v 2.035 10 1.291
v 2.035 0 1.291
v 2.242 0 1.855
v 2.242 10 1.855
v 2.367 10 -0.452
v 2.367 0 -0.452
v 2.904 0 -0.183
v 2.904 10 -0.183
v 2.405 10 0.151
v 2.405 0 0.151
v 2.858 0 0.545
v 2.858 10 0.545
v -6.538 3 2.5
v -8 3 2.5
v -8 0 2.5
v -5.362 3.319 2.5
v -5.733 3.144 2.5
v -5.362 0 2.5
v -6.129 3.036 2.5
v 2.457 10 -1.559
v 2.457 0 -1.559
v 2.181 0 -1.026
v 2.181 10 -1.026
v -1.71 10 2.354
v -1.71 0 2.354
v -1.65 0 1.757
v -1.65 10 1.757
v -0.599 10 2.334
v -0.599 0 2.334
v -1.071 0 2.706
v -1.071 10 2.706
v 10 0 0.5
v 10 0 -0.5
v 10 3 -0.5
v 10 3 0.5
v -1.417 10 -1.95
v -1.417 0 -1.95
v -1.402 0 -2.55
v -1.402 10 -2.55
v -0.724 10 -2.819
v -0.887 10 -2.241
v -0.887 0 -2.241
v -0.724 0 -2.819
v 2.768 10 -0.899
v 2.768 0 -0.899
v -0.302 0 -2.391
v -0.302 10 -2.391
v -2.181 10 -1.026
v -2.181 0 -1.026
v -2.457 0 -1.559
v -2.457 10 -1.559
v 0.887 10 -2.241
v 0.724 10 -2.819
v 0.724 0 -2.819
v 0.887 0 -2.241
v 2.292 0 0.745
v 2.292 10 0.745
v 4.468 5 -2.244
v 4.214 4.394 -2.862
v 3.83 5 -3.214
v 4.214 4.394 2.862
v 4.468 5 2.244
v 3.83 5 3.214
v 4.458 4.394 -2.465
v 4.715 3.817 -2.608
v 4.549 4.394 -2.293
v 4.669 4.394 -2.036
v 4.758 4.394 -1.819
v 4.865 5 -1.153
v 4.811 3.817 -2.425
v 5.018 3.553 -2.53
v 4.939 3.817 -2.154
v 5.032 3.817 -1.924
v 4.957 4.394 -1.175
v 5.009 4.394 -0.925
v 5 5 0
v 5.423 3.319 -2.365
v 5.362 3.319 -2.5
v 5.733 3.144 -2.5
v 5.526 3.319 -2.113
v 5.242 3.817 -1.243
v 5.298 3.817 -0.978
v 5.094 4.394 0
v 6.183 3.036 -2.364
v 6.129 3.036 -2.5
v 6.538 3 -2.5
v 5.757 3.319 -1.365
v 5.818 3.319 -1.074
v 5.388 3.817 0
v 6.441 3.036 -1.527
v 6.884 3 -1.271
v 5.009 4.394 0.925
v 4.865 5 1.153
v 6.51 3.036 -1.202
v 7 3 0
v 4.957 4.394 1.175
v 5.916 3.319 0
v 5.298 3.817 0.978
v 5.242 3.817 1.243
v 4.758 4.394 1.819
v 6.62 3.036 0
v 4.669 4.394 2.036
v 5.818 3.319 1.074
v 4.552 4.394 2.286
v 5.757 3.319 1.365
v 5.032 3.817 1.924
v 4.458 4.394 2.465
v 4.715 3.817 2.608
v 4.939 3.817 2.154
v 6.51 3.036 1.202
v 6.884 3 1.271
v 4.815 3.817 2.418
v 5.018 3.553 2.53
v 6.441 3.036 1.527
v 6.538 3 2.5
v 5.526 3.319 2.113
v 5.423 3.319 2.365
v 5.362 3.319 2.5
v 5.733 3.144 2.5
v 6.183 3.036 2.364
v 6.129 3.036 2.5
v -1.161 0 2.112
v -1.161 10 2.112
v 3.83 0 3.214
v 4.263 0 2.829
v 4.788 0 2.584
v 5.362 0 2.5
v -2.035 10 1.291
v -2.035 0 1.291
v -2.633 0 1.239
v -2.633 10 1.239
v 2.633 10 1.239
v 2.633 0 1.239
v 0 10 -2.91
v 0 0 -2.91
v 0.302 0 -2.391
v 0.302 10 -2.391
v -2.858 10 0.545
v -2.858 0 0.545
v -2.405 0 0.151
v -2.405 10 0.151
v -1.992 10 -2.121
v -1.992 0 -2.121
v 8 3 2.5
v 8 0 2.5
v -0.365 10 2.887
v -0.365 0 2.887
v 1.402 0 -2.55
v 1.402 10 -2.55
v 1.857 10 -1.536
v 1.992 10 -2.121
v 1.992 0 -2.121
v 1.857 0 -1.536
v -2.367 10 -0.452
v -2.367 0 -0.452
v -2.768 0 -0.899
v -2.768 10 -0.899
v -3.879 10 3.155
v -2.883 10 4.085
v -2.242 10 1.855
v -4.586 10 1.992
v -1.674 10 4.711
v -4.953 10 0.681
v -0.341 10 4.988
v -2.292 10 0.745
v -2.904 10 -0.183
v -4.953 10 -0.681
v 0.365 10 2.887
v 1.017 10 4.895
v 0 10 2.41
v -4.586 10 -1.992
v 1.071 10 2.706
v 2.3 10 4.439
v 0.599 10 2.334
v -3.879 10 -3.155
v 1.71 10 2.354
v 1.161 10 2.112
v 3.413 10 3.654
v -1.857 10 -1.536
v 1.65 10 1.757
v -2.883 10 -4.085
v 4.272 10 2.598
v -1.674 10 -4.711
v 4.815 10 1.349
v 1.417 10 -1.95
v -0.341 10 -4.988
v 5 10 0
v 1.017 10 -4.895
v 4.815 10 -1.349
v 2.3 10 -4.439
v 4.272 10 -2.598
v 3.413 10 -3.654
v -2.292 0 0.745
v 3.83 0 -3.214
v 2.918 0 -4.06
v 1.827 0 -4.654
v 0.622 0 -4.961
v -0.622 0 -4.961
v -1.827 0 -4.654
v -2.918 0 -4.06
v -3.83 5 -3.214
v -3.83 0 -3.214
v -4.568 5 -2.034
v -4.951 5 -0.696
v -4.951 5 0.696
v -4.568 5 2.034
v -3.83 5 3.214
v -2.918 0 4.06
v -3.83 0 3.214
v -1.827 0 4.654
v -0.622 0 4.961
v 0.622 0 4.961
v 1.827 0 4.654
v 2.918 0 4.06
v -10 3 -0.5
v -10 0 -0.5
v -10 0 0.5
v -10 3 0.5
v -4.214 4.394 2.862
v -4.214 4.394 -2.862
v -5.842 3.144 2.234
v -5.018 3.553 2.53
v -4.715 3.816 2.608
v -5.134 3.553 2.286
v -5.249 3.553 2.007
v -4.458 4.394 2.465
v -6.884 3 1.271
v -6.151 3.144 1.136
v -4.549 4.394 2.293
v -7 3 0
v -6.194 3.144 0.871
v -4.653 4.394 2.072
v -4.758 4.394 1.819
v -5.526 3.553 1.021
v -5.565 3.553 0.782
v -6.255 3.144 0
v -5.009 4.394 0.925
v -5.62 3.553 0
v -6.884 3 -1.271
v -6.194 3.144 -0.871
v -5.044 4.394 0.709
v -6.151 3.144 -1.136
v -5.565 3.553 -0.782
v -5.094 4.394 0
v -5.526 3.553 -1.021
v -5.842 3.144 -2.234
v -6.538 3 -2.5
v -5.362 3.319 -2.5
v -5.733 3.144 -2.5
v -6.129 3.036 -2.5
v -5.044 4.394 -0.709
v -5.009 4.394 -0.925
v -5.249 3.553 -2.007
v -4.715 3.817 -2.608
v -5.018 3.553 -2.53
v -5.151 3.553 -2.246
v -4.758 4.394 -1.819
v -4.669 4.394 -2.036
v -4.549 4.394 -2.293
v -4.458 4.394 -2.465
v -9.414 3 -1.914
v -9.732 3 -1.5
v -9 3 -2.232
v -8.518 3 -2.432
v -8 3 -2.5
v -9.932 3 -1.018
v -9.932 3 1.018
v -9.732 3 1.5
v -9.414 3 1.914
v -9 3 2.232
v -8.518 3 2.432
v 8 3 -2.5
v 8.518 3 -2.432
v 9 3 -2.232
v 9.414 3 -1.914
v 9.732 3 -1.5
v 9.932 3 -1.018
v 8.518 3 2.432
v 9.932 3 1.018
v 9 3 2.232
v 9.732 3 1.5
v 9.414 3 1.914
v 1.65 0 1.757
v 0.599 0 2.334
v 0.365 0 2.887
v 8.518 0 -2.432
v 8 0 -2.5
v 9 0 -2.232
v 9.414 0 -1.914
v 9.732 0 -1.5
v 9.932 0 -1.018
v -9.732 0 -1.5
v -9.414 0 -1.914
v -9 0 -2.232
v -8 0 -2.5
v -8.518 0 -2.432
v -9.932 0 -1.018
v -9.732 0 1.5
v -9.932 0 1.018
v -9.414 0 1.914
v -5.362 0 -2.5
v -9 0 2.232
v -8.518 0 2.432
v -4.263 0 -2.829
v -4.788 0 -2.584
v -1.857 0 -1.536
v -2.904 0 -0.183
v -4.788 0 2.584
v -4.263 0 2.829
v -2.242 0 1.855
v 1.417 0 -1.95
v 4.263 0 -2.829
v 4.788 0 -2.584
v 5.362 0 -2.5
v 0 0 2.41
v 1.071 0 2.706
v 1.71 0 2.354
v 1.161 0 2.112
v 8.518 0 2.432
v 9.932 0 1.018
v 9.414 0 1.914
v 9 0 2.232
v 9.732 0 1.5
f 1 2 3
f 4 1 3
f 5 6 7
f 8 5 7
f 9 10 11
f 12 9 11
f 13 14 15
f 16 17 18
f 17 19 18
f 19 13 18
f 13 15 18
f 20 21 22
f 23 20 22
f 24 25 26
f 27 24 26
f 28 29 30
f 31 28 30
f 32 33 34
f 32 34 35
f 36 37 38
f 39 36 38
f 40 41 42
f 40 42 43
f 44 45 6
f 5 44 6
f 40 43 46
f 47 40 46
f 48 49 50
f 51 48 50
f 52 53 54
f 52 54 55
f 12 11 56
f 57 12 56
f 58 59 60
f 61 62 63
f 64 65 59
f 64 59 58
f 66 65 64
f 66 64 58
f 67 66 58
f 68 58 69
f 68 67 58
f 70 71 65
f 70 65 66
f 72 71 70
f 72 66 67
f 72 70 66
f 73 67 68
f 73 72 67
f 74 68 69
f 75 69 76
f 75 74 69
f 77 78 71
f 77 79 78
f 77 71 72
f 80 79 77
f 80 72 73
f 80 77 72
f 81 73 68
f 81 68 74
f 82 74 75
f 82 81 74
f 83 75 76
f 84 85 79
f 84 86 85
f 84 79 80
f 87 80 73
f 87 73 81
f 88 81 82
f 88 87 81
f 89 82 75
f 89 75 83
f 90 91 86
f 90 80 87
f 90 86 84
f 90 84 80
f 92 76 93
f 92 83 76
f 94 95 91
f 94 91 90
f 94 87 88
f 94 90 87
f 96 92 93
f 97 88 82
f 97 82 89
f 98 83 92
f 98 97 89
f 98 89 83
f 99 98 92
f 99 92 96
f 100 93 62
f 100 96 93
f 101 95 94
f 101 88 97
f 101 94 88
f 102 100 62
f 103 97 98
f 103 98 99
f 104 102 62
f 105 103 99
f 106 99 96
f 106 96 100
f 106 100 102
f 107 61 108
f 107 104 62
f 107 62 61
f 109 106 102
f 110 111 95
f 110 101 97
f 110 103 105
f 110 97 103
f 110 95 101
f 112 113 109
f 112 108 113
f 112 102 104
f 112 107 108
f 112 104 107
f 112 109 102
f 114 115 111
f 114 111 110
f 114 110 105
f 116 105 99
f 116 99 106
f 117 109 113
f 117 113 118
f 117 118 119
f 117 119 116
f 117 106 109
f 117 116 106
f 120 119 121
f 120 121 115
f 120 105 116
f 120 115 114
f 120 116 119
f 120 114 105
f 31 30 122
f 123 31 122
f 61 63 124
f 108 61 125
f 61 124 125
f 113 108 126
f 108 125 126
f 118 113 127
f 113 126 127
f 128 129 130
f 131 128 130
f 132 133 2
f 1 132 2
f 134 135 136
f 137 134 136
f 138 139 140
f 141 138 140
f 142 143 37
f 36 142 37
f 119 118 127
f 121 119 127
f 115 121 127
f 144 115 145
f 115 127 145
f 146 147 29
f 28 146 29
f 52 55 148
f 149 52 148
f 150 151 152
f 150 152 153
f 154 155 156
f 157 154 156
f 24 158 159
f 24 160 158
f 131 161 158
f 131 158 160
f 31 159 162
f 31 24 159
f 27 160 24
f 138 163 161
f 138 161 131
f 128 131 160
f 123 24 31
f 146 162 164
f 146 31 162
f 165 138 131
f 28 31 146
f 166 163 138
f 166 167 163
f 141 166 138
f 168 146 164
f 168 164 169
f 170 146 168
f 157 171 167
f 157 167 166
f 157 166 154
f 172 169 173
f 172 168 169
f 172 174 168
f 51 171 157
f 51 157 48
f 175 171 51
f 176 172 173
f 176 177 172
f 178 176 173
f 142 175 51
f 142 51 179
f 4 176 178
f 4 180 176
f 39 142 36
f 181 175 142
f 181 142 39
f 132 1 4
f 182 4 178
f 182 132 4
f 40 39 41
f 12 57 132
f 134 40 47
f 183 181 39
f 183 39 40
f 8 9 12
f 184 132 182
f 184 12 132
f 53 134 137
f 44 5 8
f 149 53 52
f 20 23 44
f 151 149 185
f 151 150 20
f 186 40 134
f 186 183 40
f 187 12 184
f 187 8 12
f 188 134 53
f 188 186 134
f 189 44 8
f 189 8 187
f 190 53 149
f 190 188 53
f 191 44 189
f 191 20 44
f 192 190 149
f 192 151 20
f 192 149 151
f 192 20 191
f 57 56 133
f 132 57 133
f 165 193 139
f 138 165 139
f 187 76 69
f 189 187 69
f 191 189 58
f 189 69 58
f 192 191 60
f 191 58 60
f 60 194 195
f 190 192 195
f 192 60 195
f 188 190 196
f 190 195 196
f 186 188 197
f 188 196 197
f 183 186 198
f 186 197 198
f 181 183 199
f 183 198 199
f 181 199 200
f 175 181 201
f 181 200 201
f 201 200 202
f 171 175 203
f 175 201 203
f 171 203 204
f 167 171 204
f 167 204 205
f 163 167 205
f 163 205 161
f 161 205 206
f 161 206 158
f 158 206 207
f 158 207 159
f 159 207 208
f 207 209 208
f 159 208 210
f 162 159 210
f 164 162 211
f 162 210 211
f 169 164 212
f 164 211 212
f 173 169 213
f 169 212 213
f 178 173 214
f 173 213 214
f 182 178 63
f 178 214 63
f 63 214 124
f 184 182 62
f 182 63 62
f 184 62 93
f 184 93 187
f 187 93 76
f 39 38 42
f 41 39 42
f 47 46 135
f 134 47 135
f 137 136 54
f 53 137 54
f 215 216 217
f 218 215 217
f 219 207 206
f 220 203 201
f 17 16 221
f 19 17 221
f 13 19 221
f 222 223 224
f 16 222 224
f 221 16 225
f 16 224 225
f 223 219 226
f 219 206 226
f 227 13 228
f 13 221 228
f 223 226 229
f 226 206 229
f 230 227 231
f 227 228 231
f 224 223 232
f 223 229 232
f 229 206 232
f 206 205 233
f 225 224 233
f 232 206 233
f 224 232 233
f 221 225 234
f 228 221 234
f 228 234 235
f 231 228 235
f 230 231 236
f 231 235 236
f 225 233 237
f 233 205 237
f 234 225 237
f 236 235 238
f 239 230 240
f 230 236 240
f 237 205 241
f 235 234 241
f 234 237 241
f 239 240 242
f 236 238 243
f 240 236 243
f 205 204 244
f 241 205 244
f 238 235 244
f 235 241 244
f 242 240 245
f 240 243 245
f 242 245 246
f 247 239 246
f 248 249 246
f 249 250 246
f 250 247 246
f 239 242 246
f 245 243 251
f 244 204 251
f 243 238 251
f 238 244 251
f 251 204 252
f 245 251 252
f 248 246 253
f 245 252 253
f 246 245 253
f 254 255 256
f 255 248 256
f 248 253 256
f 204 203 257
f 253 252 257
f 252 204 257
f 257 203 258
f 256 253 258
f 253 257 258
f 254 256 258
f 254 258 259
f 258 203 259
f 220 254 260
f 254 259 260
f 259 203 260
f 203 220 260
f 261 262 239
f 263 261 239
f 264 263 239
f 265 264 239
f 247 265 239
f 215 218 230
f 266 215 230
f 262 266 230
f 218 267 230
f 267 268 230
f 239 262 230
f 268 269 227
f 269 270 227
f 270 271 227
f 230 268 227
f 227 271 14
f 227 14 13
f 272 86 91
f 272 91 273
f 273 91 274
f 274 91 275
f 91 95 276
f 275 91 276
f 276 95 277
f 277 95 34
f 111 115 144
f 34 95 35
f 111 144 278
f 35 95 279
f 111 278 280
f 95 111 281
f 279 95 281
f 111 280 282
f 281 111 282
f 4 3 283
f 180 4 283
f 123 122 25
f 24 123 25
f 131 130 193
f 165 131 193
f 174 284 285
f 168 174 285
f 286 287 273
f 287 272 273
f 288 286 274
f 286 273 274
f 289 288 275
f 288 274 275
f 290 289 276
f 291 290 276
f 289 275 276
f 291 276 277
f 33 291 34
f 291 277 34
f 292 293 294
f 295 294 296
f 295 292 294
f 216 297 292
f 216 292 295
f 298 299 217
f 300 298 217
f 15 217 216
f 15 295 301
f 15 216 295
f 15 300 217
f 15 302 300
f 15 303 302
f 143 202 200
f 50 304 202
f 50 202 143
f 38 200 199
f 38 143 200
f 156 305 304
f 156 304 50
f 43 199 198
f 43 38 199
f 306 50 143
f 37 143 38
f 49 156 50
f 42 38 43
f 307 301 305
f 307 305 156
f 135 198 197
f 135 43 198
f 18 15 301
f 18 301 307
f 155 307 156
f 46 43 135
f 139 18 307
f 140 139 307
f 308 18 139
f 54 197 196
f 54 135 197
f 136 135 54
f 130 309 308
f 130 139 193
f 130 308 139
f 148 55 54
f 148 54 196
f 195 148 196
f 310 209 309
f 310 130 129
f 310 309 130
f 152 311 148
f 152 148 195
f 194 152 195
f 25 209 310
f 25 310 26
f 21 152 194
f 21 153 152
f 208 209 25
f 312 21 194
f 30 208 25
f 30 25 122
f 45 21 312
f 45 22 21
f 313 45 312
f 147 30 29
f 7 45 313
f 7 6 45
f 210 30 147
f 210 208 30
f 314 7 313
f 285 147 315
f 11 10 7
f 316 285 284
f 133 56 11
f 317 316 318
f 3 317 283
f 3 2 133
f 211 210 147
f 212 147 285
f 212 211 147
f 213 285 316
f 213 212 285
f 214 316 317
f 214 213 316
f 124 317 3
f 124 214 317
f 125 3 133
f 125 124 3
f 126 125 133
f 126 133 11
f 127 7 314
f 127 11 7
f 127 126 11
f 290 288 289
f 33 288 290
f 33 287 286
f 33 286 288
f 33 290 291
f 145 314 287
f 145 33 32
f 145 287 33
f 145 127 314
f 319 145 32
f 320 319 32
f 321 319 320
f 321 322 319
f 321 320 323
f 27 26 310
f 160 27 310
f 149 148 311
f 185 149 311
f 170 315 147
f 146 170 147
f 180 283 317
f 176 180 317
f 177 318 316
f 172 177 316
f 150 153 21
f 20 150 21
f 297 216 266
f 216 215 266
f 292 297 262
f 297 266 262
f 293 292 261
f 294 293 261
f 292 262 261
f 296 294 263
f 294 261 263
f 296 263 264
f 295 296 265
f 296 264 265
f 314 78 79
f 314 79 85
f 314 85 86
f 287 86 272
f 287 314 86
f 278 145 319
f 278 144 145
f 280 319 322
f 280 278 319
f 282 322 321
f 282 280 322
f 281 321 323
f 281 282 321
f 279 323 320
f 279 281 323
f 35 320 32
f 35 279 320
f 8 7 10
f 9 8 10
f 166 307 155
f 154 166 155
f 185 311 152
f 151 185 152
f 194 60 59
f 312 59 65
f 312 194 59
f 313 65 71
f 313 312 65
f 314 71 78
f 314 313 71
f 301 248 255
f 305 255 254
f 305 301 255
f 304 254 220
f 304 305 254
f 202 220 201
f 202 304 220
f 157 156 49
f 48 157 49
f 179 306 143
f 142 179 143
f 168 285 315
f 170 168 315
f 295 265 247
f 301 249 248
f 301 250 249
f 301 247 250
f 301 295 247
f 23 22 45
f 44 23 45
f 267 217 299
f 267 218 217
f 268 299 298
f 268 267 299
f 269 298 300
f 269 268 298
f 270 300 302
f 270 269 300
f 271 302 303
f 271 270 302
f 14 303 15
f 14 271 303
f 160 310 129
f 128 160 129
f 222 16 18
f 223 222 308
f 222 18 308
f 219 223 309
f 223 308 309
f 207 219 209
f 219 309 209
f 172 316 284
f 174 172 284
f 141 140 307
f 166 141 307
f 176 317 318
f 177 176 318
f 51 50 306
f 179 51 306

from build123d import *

# Parameters (mm, degrees)
SKETCH3_R           = 5
BOSS_EXTRUDE1_DEPTH = 10
SKETCH4_W           = 20
SKETCH4_H           = 5
BOSS_EXTRUDE2_DEPTH = 3
CUT_EXTRUDE1_DEPTH  = 11
FILLET2_R           = 2


with BuildPart() as part:
    # Sketch3 → Boss-Extrude1 (new body)
    with BuildSketch(Plane(origin=(0, 0, 0), x_dir=(1, 0, 0), z_dir=(0, 1, 0))):
        Circle(SKETCH3_R)
    extrude(amount=BOSS_EXTRUDE1_DEPTH)

    # Sketch4 → Boss-Extrude2 (add)
    with BuildSketch(Plane.XZ):
        Rectangle(SKETCH4_W, SKETCH4_H)
    extrude(amount=-BOSS_EXTRUDE2_DEPTH)

    # Sketch2 → Cut-Extrude1 (cut, through all)
    with BuildSketch(Plane(origin=(0, 0, 0), x_dir=(1, 0, 0), z_dir=(0, 1, 0))):
        Polygon((-0.302053093, 2.39099643), (0, 2.91), (0.302053093, 2.39099643), (0.723687572, 2.818576999), (0.887180172, 2.240761331), (1.401903192, 2.550052439), (1.416562458, 1.949730956), (1.992032078, 2.121298706), (1.856936915, 1.536191815), (2.456994263, 1.559255973), (2.180633196, 1.026128093), (2.767574462, 0.899239454), (2.367312274, 0.451588968), (2.90425778, 0.182720412), (2.405244416, -0.151325152), (2.8584559, -0.545279625), (2.292046204, -0.744730956), (2.633046723, -1.239017738), (2.0348303, -1.291342576), (2.242193536, -1.85490381), (1.649758525, -1.756814392), (1.710455084, -2.354239454), (1.161026355, -2.111899099), (1.071242448, -2.705649574), (0.599342628, -2.334285418), (0.36471971, -2.887053781), (0, -2.41), (-0.36471971, -2.887053781), (-0.599342628, -2.334285418), (-1.071242448, -2.705649574), (-1.161026355, -2.111899099), (-1.710455084, -2.354239454), (-1.649758525, -1.756814392), (-2.242193536, -1.85490381), (-2.0348303, -1.291342576), (-2.633046723, -1.239017738), (-2.292046204, -0.744730956), (-2.8584559, -0.545279625), (-2.405244416, -0.151325152), (-2.90425778, 0.182720412), (-2.367312274, 0.451588968), (-2.767574462, 0.899239454), (-2.180633196, 1.026128093), (-2.456994263, 1.559255973), (-1.856936915, 1.536191815), (-1.992032078, 2.121298706), (-1.416562458, 1.949730956), (-1.401903192, 2.550052439), (-0.887180172, 2.240761331), (-0.723687572, 2.818576999), align=None)
    extrude(amount=CUT_EXTRUDE1_DEPTH, mode=Mode.SUBTRACT)

    # Fillet2
    fillet2_edges = [part.edges().sort_by_distance(p)[0] for p in [
        (10, 1.5, -2.5),
        (-10, 1.5, 2.5),
        (10, 1.5, 2.5),
        (4.330127019, 1.5, -2.5),
        (-4.330127019, 1.5, -2.5),
        (-10, 1.5, -2.5),
        (-4.330127019, 1.5, 2.5),
        (4.330127019, 1.5, 2.5),
        (-5, 3, 0),
        (4.829629131, 3, -1.294095226),
    ]]
    fillet(fillet2_edges, radius=FILLET2_R)


solid = part.part
